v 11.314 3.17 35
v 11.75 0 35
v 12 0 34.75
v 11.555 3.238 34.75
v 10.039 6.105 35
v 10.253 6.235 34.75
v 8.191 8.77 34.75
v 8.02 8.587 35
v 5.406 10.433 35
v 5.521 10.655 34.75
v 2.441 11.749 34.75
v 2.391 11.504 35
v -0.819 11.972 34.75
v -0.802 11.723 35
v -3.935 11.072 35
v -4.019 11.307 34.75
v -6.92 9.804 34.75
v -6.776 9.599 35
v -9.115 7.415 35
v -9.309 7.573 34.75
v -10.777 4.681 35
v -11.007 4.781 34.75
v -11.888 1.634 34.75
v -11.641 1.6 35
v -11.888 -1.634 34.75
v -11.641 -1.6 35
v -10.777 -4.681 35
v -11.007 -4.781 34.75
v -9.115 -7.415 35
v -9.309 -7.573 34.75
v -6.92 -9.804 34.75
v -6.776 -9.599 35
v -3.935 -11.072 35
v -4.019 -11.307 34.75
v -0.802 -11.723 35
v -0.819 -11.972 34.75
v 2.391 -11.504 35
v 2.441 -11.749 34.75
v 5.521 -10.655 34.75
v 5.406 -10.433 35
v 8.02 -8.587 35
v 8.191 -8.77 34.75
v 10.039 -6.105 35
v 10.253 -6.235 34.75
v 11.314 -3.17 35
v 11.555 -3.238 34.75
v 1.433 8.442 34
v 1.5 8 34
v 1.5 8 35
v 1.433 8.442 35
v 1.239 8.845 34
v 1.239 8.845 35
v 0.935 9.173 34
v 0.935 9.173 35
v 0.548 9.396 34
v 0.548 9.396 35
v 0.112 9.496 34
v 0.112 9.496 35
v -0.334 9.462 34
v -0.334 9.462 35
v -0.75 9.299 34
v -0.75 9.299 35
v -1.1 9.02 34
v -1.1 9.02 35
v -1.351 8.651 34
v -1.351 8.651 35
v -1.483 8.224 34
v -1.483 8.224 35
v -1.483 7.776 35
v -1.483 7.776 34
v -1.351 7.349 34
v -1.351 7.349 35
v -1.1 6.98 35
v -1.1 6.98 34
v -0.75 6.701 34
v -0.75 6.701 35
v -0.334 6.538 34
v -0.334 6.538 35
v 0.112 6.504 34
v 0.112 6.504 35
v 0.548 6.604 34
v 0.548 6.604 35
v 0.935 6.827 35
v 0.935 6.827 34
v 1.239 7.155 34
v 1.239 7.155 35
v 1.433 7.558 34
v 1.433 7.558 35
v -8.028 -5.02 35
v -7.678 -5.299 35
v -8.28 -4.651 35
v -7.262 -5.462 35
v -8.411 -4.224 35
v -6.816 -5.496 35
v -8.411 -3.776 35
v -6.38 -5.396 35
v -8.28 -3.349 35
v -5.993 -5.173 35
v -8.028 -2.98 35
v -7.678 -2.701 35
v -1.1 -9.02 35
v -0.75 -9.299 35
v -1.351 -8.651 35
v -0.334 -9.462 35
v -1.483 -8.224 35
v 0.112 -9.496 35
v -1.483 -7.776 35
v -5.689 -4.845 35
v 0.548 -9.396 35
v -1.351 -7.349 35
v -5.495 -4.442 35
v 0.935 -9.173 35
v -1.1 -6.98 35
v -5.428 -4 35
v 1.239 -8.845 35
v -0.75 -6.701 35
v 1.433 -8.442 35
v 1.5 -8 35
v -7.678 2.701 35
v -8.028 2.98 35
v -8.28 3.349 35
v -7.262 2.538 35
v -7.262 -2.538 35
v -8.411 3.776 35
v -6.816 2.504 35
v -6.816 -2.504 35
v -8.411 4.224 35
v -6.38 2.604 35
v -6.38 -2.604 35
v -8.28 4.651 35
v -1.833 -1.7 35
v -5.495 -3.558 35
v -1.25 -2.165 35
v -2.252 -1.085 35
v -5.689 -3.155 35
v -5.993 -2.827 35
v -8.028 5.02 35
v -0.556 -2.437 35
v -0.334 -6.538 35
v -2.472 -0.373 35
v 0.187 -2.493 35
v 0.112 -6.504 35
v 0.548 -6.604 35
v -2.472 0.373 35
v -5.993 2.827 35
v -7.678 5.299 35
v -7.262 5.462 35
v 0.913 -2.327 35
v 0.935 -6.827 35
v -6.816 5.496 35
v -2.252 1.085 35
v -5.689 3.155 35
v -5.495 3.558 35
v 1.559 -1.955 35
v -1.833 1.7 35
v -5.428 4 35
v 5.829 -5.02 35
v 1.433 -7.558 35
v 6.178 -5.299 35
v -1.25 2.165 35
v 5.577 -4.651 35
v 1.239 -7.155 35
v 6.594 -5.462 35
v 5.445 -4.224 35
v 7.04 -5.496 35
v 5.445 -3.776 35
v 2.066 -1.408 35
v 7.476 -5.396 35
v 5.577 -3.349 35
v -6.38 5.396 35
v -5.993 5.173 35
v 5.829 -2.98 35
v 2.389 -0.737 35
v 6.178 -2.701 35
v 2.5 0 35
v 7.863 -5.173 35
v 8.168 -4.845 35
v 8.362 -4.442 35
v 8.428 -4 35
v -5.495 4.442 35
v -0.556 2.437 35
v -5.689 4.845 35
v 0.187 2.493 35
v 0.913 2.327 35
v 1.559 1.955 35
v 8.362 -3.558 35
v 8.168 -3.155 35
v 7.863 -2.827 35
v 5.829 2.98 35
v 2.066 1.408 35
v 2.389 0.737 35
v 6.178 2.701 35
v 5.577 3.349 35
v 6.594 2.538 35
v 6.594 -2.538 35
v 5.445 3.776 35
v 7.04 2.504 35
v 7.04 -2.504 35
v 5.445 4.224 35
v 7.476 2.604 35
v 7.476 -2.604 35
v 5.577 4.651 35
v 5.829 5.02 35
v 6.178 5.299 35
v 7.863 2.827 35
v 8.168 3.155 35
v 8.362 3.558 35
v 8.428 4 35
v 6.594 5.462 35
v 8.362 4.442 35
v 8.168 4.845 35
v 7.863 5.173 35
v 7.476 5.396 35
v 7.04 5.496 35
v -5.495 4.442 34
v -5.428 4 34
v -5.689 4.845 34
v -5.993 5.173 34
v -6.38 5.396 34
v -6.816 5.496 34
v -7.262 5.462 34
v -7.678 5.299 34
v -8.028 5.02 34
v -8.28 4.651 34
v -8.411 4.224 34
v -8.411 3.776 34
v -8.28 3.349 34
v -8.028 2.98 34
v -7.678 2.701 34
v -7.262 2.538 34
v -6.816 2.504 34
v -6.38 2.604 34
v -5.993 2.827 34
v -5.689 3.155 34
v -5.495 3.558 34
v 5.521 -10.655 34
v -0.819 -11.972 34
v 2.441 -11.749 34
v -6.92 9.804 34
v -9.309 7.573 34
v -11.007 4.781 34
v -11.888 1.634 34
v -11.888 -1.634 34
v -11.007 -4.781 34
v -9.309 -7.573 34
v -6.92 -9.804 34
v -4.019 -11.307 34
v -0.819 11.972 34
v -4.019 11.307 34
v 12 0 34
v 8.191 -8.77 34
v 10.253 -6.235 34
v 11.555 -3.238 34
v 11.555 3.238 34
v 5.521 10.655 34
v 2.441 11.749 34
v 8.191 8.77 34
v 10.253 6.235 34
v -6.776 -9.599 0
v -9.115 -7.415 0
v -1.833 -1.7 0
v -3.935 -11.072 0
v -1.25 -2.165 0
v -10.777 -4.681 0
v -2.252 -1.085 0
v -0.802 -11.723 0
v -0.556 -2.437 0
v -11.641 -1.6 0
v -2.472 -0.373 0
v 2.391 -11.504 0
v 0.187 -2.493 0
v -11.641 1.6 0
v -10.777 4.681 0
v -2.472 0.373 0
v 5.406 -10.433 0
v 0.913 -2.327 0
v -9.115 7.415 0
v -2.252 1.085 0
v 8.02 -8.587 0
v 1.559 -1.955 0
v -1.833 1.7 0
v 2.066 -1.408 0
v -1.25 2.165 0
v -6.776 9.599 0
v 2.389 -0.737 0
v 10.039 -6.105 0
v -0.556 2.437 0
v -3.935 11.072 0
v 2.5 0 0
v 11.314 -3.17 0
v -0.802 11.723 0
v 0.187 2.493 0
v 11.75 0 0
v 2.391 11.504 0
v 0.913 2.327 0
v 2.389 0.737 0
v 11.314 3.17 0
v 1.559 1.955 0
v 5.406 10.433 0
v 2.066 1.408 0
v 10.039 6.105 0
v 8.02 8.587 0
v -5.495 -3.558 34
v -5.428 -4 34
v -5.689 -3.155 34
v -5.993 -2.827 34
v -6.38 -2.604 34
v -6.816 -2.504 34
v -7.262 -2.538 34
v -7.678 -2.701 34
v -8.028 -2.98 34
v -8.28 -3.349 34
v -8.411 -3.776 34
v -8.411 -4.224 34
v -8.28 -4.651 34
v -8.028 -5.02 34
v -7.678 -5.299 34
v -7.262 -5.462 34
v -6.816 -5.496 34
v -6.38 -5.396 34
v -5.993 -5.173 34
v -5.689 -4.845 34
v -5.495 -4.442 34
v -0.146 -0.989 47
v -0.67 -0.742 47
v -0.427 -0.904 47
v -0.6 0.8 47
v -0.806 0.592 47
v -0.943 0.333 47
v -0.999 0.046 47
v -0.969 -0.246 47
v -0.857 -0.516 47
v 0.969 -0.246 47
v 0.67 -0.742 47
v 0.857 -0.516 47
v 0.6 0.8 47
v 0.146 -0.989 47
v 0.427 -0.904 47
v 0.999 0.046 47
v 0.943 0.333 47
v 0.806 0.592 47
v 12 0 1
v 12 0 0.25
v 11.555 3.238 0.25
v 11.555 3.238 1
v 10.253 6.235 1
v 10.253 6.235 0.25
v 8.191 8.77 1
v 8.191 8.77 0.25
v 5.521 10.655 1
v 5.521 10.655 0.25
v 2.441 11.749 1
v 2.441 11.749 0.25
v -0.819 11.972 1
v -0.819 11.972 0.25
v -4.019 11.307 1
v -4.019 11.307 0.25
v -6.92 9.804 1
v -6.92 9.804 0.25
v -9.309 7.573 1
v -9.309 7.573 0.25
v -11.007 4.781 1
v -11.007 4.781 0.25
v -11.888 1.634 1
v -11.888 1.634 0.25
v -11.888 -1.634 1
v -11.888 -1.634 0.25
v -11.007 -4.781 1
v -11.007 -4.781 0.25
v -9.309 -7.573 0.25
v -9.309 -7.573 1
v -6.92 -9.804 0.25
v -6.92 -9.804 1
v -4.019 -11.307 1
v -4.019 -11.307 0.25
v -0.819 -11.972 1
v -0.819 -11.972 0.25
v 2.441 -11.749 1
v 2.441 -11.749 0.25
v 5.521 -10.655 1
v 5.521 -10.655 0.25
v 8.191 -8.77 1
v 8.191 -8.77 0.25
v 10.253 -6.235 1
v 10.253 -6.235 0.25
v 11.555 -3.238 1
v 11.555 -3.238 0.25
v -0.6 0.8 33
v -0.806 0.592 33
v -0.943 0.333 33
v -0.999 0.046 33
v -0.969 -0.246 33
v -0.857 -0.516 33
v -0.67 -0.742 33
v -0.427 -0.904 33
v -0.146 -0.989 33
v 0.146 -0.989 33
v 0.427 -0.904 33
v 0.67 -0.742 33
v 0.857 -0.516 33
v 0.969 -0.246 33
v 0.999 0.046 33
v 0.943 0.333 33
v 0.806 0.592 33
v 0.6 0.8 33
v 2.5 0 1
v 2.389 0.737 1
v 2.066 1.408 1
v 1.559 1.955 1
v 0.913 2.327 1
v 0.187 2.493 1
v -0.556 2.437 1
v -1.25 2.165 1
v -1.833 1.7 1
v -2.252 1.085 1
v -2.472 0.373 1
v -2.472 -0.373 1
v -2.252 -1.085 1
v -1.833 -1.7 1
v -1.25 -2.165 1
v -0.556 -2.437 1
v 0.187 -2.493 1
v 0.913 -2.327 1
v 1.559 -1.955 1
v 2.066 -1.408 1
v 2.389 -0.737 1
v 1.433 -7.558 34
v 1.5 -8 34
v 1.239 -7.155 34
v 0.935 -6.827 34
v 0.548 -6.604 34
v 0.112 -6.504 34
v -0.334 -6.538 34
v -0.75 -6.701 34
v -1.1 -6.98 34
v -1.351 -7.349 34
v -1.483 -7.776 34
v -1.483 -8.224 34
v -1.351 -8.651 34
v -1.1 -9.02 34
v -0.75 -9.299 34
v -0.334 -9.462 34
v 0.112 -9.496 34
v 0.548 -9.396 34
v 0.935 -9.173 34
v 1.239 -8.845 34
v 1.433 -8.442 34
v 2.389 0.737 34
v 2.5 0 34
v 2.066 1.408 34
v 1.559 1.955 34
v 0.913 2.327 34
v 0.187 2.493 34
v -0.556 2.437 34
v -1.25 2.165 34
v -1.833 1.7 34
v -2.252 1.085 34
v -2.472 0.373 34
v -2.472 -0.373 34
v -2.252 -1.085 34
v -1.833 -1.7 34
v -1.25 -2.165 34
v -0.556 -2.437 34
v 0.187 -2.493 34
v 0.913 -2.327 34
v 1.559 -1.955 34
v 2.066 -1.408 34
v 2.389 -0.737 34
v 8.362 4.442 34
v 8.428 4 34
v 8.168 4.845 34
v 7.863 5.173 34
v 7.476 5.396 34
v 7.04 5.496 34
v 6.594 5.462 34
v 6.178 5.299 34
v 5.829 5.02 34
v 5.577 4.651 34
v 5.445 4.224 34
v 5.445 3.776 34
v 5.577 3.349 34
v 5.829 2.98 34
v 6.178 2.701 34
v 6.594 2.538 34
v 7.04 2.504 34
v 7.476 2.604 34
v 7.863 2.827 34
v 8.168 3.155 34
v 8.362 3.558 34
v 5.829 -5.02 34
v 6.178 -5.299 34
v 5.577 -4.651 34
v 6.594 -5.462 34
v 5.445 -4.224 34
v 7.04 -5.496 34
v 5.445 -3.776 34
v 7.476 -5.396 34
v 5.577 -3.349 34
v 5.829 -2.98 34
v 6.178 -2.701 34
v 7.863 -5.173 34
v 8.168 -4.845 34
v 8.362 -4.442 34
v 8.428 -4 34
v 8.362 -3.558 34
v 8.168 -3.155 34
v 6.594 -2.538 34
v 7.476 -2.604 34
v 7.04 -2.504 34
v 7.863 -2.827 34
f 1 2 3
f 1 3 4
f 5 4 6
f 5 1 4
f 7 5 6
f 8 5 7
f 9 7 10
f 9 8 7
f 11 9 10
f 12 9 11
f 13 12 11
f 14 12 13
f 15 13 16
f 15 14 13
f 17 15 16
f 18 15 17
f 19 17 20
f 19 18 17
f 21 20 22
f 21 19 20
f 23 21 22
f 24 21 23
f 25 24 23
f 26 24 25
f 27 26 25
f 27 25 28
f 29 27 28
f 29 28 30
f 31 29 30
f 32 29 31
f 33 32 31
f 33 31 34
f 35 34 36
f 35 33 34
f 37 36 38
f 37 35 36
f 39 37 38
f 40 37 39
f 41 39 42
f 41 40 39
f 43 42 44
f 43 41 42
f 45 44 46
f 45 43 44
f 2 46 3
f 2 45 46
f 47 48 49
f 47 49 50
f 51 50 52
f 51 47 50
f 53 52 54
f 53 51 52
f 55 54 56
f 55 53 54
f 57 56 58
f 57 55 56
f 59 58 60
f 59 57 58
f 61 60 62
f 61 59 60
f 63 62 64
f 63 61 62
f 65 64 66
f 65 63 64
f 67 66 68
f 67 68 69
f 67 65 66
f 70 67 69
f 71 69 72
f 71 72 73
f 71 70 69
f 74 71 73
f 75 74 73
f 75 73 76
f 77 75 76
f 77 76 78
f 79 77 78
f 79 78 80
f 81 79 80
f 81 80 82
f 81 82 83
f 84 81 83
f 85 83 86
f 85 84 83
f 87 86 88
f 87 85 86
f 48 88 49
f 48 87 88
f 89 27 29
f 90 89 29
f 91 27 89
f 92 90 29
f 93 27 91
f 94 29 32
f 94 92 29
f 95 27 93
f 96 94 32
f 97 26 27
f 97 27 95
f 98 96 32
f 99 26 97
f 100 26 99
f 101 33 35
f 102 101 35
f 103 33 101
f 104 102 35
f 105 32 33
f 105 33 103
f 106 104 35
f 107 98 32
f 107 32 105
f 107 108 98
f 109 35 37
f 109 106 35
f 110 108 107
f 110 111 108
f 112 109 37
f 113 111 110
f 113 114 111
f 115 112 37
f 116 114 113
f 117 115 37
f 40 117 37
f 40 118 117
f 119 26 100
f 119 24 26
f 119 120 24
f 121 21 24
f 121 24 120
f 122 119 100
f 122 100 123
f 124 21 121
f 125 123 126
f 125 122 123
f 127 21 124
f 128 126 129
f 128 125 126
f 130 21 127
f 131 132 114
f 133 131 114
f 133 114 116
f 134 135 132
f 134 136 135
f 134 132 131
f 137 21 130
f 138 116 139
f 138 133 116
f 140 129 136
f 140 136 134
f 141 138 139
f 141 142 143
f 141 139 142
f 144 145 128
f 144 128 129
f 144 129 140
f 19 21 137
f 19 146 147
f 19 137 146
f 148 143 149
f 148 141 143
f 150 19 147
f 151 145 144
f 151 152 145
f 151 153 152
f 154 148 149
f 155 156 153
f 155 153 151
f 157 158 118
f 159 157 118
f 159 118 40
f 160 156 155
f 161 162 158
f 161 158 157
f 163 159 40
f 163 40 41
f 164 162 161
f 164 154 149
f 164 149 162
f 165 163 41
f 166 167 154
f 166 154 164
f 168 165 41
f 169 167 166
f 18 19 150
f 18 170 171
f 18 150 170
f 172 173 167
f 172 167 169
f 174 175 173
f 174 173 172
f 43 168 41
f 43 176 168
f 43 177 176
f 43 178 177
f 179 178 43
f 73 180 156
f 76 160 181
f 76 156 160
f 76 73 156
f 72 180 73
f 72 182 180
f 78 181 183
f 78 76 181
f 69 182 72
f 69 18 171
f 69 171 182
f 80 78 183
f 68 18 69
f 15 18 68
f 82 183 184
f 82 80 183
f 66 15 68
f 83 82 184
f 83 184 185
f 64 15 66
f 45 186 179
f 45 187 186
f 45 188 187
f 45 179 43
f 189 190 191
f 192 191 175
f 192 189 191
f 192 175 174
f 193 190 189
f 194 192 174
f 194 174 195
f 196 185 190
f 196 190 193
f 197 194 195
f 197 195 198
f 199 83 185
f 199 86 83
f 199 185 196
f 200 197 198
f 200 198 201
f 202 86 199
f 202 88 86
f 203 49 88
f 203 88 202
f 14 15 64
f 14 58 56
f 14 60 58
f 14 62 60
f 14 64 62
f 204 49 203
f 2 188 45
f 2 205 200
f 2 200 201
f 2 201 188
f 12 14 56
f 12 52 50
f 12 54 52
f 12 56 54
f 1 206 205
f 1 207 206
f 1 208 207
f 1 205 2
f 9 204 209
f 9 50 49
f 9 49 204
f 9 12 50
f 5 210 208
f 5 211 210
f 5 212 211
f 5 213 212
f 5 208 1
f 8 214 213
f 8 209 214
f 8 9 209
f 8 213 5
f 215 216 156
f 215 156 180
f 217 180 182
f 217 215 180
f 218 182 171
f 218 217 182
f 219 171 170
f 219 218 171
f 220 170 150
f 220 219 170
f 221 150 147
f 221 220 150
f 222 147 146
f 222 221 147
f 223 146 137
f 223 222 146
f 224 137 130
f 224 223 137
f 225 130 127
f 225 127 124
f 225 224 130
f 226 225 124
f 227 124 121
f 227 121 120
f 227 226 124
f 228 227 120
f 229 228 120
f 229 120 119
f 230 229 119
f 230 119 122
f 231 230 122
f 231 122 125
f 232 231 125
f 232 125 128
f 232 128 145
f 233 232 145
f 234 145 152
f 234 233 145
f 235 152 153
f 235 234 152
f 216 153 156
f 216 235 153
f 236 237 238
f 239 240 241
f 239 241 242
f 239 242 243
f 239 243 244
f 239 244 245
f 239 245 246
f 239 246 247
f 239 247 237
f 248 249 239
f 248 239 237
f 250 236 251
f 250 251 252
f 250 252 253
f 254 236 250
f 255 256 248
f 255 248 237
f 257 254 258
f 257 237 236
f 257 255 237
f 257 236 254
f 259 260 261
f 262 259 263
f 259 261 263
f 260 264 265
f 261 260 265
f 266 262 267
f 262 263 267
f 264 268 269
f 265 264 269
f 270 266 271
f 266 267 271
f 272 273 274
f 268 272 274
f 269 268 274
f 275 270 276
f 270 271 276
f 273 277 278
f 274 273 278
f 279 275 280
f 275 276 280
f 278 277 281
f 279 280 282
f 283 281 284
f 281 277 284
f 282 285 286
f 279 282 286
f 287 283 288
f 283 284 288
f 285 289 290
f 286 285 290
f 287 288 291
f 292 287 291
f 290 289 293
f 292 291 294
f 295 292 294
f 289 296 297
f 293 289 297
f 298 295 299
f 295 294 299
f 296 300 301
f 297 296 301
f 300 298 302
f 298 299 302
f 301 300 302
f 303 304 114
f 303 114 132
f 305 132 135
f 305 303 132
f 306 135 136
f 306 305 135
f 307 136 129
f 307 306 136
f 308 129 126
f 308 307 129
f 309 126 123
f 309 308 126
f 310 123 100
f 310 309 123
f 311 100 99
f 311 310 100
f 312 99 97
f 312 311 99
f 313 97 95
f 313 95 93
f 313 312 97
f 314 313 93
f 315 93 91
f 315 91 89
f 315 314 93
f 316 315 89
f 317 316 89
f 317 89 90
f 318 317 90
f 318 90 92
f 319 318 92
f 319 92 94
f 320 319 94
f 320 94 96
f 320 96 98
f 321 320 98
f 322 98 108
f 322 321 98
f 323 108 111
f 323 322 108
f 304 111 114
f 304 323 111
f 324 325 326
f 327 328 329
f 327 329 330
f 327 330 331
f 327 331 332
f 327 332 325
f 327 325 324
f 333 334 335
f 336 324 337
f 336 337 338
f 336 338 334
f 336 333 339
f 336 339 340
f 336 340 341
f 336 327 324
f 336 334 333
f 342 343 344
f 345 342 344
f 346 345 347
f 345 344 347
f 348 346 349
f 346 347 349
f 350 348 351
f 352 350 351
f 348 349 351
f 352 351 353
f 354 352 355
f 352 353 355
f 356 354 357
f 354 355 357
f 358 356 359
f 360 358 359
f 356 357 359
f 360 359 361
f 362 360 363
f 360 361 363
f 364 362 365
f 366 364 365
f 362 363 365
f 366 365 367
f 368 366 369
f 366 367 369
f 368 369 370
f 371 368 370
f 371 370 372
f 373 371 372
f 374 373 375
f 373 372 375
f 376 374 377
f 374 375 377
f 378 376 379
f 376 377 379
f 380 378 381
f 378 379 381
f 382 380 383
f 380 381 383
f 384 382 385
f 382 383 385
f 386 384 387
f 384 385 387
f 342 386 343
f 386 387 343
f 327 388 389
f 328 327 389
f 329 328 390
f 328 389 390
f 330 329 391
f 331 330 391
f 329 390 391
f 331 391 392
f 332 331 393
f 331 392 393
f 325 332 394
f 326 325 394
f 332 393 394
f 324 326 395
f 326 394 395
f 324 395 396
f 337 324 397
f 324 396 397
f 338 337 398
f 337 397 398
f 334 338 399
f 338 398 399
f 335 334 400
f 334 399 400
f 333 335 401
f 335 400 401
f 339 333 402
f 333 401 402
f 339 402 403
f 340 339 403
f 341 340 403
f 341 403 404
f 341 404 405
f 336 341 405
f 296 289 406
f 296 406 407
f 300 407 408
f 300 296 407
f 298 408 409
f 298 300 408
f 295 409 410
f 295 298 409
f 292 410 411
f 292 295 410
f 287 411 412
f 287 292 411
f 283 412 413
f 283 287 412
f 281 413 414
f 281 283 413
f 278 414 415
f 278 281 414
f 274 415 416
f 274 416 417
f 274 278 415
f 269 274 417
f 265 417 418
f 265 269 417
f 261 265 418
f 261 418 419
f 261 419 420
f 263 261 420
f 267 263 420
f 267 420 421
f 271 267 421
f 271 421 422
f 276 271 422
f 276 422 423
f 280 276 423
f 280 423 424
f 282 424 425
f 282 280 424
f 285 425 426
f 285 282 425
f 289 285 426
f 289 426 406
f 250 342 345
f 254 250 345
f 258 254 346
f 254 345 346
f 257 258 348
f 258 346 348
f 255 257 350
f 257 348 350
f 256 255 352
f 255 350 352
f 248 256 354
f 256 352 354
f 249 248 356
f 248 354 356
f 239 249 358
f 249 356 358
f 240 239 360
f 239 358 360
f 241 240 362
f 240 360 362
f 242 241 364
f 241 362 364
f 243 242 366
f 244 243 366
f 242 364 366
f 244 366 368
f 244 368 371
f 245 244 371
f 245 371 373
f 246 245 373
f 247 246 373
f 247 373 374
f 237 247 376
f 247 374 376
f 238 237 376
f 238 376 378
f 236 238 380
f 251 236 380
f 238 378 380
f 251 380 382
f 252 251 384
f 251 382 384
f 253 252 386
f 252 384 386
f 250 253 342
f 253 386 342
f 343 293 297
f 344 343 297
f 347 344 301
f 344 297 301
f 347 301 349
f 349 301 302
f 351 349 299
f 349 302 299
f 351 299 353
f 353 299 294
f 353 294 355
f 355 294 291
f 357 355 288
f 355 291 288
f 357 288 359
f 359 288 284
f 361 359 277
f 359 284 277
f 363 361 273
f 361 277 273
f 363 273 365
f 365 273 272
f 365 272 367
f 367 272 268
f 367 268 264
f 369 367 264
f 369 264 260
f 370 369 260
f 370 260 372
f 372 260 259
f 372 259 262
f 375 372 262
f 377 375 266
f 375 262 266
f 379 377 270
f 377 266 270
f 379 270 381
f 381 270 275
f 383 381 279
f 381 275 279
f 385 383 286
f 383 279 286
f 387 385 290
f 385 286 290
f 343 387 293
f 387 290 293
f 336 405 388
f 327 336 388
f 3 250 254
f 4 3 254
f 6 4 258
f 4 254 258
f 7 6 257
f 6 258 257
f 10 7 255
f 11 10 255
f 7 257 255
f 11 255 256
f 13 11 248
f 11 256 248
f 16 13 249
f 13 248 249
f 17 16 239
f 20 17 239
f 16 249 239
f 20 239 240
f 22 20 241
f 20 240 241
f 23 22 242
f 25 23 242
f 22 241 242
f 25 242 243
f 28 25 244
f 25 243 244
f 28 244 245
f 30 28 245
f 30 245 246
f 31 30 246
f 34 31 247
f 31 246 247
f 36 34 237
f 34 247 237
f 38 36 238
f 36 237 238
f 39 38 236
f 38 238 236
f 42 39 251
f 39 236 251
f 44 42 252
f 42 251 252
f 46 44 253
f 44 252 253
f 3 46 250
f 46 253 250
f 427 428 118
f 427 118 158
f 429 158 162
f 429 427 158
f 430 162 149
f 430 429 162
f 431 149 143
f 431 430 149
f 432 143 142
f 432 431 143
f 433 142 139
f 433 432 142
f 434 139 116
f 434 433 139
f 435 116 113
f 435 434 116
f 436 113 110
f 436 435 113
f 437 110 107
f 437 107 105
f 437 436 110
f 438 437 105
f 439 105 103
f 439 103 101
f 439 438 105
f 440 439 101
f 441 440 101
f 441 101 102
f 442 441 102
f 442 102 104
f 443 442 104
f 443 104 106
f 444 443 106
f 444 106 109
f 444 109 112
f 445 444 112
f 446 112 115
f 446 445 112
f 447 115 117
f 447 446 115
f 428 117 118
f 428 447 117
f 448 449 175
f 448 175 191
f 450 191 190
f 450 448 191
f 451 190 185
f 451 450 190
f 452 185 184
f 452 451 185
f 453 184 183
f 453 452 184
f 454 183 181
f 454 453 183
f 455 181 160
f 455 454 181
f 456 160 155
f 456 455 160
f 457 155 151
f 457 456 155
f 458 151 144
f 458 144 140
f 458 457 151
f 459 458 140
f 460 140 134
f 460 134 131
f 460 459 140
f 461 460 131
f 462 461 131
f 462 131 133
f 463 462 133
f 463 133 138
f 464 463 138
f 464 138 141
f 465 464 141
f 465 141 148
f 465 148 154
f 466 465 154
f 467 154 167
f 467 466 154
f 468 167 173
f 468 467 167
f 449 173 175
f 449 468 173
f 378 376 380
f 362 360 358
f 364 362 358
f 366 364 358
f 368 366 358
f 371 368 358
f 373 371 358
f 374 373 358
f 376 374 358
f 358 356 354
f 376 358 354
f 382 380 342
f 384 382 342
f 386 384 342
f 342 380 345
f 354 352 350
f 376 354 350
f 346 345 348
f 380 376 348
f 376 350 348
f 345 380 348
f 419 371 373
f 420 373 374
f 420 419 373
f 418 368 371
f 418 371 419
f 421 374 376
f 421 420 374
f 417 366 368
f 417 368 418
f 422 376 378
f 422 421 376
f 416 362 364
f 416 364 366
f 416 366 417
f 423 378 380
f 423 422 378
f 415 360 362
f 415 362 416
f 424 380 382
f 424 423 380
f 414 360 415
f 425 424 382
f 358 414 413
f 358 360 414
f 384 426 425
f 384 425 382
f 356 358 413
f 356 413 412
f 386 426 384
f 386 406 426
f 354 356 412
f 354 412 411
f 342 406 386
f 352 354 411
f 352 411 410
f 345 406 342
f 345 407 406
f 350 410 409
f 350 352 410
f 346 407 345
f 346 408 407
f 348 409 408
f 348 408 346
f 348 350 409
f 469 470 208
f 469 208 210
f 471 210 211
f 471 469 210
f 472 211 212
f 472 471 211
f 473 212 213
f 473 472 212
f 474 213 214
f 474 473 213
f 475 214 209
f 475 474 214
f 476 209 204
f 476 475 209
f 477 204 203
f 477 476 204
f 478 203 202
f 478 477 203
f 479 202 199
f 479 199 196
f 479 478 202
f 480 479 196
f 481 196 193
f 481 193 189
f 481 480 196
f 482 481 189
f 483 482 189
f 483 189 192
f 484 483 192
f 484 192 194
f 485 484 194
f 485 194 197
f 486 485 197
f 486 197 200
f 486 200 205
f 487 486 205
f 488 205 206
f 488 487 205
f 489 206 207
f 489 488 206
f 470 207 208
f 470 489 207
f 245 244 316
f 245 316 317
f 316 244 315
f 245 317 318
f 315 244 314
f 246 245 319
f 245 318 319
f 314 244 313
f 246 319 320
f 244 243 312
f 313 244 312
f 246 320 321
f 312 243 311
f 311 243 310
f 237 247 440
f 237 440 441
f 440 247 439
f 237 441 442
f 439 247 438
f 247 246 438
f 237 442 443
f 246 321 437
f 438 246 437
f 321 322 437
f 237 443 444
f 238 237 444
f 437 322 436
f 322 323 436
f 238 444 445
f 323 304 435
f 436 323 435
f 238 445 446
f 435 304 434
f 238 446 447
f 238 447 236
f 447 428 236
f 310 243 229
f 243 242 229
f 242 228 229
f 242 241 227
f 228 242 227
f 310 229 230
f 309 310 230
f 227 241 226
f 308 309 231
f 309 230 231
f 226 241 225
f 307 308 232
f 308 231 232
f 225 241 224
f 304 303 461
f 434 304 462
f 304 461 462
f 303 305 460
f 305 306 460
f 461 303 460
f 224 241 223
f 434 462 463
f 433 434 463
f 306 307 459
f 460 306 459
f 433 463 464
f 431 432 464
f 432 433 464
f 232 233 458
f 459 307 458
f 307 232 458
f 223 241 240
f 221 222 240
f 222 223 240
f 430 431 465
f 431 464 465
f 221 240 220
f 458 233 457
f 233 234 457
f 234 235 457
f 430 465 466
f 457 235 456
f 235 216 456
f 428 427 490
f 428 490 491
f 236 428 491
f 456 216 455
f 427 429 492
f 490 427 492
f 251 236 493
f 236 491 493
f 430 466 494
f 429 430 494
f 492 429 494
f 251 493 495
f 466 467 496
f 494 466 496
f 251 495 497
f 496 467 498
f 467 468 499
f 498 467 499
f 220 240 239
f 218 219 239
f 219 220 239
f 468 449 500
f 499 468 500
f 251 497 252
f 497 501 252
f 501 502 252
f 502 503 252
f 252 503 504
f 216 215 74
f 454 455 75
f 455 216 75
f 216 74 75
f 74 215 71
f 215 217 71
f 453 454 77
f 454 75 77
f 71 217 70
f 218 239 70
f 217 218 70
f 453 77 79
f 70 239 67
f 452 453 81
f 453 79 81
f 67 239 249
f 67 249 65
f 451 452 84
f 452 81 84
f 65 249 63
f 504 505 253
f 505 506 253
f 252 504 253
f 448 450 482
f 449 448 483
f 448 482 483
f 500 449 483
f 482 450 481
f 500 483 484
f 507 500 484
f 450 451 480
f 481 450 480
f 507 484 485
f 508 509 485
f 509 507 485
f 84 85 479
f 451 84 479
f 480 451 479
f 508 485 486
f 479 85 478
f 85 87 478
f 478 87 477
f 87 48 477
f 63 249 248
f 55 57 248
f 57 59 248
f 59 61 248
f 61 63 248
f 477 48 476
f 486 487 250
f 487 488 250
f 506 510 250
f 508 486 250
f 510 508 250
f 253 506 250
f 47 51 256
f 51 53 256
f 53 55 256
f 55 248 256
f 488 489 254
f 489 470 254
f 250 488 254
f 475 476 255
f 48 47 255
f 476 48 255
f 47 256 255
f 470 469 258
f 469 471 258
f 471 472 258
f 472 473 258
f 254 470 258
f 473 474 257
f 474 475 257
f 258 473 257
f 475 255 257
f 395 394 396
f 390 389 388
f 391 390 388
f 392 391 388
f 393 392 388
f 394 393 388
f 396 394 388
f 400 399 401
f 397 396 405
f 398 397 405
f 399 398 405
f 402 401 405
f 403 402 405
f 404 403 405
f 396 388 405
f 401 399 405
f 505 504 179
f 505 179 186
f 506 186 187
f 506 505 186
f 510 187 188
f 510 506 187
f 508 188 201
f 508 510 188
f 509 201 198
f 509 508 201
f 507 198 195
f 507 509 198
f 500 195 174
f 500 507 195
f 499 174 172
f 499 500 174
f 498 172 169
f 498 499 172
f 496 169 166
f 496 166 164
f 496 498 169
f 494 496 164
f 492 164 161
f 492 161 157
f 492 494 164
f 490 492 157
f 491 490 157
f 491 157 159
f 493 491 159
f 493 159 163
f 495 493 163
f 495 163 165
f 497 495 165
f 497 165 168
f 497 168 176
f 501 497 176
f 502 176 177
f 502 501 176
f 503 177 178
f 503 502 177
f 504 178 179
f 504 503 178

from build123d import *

# Parameters (mm, degrees)
F0_R      = 12
F0_R_2    = 1.5
F0_R_3    = 2.5
F1_DEPTH  = 1
F2_START  = 1
F2_DEPTH  = 33
F3_START  = 34
F3_DEPTH  = 1
F4_START  = 33
F4_DEPTH  = 14
F5_SIZE   = 0.25
F5_2_SIZE = 0.25


with BuildPart() as f1:
    # F0 (on Top) → F1 (new body)
    with BuildSketch(Plane.XY):
        Circle(F0_R)
        with Locations((-6.9282032303, -4)):
            Circle(F0_R_2, mode=Mode.SUBTRACT)
        with Locations((0, -8)):
            Circle(F0_R_2, mode=Mode.SUBTRACT)
        with Locations((6.9282032303, -4)):
            Circle(F0_R_2, mode=Mode.SUBTRACT)
        with Locations((-6.9282032303, 4)):
            Circle(F0_R_2, mode=Mode.SUBTRACT)
        Circle(F0_R_3, mode=Mode.SUBTRACT)
        with Locations((6.9282032303, 4)):
            Circle(F0_R_2, mode=Mode.SUBTRACT)
        with Locations((0, 8)):
            Circle(F0_R_2, mode=Mode.SUBTRACT)
        with Locations((-6.9282032303, 4)):
            Circle(F0_R_2)
        with Locations((-6.9282032303, -4)):
            Circle(F0_R_2)
        with Locations((0, -8)):
            Circle(F0_R_2)
        with Locations((6.9282032303, -4)):
            Circle(F0_R_2)
        with Locations((6.9282032303, 4)):
            Circle(F0_R_2)
        with Locations((0, 8)):
            Circle(F0_R_2)
    extrude(amount=F1_DEPTH)

    # F5#2
    f5_2_edges = [f1.edges().sort_by_distance(p)[0] for p in [
        (-12, 0, 0),
    ]]
    chamfer(f5_2_edges, length=F5_2_SIZE)


with BuildPart() as f2:
    # F0 (on Top) → F2 (new body)
    with BuildSketch(Plane.XY.offset(F2_START)):
        Circle(F0_R)
        with Locations((-6.9282032303, -4)):
            Circle(F0_R_2, mode=Mode.SUBTRACT)
        with Locations((0, -8)):
            Circle(F0_R_2, mode=Mode.SUBTRACT)
        with Locations((6.9282032303, -4)):
            Circle(F0_R_2, mode=Mode.SUBTRACT)
        with Locations((-6.9282032303, 4)):
            Circle(F0_R_2, mode=Mode.SUBTRACT)
        Circle(F0_R_3, mode=Mode.SUBTRACT)
        with Locations((6.9282032303, 4)):
            Circle(F0_R_2, mode=Mode.SUBTRACT)
        with Locations((0, 8)):
            Circle(F0_R_2, mode=Mode.SUBTRACT)
        Circle(F0_R_3)
        with BuildLine():
            ThreePointArc((0.6, 0.8), (0.894427191, 0.4472135955), (1, 0))
            ThreePointArc((1, 0), (-0.4472135955, -0.894427191), (-0.6, 0.8))
            ThreePointArc((-0.6, 0.8), (0, 1), (0.6, 0.8))
        make_face(mode=Mode.SUBTRACT)
        with Locations((-6.9282032303, -4)):
            Circle(F0_R_2)
        with Locations((0, -8)):
            Circle(F0_R_2)
        with Locations((6.9282032303, 4)):
            Circle(F0_R_2)
        with Locations((6.9282032303, -4)):
            Circle(F0_R_2)
        with Locations((0, 8)):
            Circle(F0_R_2)
        with Locations((-6.9282032303, 4)):
            Circle(F0_R_2)
        with BuildLine():
            ThreePointArc((-0.6, 0.8), (-0.4472135955, -0.894427191), (1, 0))
            ThreePointArc((1, 0), (0.894427191, 0.4472135955), (0.6, 0.8))
            Line((0.6, 0.8), (-0.6, 0.8))
        make_face()
        with BuildLine():
            Line((-0.6, 0.8), (0.6, 0.8))
            ThreePointArc((0.6, 0.8), (0, 1), (-0.6, 0.8))
        make_face()
    extrude(amount=F2_DEPTH)


with BuildPart() as f3:
    # F0 (on Top) → F3 (new body)
    with BuildSketch(Plane.XY.offset(F3_START)):
        Circle(F0_R)
        with Locations((-6.9282032303, -4)):
            Circle(F0_R_2, mode=Mode.SUBTRACT)
        with Locations((0, -8)):
            Circle(F0_R_2, mode=Mode.SUBTRACT)
        with Locations((6.9282032303, -4)):
            Circle(F0_R_2, mode=Mode.SUBTRACT)
        with Locations((-6.9282032303, 4)):
            Circle(F0_R_2, mode=Mode.SUBTRACT)
        Circle(F0_R_3, mode=Mode.SUBTRACT)
        with Locations((6.9282032303, 4)):
            Circle(F0_R_2, mode=Mode.SUBTRACT)
        with Locations((0, 8)):
            Circle(F0_R_2, mode=Mode.SUBTRACT)
    extrude(amount=F3_DEPTH)

    # F5
    f5_edges = [f3.edges().sort_by_distance(p)[0] for p in [
        (-12, 0, 35),
    ]]
    chamfer(f5_edges, length=F5_SIZE)


with BuildPart() as f4:
    # F0 (on Top) → F4 (new body)
    with BuildSketch(Plane.XY.offset(F4_START)):
        with BuildLine():
            ThreePointArc((-0.6, 0.8), (-0.4472135955, -0.894427191), (1, 0))
            ThreePointArc((1, 0), (0.894427191, 0.4472135955), (0.6, 0.8))
            Line((0.6, 0.8), (-0.6, 0.8))
        make_face()
    extrude(amount=F4_DEPTH)


solid = Compound([f1.part, f2.part, f3.part, f4.part])
